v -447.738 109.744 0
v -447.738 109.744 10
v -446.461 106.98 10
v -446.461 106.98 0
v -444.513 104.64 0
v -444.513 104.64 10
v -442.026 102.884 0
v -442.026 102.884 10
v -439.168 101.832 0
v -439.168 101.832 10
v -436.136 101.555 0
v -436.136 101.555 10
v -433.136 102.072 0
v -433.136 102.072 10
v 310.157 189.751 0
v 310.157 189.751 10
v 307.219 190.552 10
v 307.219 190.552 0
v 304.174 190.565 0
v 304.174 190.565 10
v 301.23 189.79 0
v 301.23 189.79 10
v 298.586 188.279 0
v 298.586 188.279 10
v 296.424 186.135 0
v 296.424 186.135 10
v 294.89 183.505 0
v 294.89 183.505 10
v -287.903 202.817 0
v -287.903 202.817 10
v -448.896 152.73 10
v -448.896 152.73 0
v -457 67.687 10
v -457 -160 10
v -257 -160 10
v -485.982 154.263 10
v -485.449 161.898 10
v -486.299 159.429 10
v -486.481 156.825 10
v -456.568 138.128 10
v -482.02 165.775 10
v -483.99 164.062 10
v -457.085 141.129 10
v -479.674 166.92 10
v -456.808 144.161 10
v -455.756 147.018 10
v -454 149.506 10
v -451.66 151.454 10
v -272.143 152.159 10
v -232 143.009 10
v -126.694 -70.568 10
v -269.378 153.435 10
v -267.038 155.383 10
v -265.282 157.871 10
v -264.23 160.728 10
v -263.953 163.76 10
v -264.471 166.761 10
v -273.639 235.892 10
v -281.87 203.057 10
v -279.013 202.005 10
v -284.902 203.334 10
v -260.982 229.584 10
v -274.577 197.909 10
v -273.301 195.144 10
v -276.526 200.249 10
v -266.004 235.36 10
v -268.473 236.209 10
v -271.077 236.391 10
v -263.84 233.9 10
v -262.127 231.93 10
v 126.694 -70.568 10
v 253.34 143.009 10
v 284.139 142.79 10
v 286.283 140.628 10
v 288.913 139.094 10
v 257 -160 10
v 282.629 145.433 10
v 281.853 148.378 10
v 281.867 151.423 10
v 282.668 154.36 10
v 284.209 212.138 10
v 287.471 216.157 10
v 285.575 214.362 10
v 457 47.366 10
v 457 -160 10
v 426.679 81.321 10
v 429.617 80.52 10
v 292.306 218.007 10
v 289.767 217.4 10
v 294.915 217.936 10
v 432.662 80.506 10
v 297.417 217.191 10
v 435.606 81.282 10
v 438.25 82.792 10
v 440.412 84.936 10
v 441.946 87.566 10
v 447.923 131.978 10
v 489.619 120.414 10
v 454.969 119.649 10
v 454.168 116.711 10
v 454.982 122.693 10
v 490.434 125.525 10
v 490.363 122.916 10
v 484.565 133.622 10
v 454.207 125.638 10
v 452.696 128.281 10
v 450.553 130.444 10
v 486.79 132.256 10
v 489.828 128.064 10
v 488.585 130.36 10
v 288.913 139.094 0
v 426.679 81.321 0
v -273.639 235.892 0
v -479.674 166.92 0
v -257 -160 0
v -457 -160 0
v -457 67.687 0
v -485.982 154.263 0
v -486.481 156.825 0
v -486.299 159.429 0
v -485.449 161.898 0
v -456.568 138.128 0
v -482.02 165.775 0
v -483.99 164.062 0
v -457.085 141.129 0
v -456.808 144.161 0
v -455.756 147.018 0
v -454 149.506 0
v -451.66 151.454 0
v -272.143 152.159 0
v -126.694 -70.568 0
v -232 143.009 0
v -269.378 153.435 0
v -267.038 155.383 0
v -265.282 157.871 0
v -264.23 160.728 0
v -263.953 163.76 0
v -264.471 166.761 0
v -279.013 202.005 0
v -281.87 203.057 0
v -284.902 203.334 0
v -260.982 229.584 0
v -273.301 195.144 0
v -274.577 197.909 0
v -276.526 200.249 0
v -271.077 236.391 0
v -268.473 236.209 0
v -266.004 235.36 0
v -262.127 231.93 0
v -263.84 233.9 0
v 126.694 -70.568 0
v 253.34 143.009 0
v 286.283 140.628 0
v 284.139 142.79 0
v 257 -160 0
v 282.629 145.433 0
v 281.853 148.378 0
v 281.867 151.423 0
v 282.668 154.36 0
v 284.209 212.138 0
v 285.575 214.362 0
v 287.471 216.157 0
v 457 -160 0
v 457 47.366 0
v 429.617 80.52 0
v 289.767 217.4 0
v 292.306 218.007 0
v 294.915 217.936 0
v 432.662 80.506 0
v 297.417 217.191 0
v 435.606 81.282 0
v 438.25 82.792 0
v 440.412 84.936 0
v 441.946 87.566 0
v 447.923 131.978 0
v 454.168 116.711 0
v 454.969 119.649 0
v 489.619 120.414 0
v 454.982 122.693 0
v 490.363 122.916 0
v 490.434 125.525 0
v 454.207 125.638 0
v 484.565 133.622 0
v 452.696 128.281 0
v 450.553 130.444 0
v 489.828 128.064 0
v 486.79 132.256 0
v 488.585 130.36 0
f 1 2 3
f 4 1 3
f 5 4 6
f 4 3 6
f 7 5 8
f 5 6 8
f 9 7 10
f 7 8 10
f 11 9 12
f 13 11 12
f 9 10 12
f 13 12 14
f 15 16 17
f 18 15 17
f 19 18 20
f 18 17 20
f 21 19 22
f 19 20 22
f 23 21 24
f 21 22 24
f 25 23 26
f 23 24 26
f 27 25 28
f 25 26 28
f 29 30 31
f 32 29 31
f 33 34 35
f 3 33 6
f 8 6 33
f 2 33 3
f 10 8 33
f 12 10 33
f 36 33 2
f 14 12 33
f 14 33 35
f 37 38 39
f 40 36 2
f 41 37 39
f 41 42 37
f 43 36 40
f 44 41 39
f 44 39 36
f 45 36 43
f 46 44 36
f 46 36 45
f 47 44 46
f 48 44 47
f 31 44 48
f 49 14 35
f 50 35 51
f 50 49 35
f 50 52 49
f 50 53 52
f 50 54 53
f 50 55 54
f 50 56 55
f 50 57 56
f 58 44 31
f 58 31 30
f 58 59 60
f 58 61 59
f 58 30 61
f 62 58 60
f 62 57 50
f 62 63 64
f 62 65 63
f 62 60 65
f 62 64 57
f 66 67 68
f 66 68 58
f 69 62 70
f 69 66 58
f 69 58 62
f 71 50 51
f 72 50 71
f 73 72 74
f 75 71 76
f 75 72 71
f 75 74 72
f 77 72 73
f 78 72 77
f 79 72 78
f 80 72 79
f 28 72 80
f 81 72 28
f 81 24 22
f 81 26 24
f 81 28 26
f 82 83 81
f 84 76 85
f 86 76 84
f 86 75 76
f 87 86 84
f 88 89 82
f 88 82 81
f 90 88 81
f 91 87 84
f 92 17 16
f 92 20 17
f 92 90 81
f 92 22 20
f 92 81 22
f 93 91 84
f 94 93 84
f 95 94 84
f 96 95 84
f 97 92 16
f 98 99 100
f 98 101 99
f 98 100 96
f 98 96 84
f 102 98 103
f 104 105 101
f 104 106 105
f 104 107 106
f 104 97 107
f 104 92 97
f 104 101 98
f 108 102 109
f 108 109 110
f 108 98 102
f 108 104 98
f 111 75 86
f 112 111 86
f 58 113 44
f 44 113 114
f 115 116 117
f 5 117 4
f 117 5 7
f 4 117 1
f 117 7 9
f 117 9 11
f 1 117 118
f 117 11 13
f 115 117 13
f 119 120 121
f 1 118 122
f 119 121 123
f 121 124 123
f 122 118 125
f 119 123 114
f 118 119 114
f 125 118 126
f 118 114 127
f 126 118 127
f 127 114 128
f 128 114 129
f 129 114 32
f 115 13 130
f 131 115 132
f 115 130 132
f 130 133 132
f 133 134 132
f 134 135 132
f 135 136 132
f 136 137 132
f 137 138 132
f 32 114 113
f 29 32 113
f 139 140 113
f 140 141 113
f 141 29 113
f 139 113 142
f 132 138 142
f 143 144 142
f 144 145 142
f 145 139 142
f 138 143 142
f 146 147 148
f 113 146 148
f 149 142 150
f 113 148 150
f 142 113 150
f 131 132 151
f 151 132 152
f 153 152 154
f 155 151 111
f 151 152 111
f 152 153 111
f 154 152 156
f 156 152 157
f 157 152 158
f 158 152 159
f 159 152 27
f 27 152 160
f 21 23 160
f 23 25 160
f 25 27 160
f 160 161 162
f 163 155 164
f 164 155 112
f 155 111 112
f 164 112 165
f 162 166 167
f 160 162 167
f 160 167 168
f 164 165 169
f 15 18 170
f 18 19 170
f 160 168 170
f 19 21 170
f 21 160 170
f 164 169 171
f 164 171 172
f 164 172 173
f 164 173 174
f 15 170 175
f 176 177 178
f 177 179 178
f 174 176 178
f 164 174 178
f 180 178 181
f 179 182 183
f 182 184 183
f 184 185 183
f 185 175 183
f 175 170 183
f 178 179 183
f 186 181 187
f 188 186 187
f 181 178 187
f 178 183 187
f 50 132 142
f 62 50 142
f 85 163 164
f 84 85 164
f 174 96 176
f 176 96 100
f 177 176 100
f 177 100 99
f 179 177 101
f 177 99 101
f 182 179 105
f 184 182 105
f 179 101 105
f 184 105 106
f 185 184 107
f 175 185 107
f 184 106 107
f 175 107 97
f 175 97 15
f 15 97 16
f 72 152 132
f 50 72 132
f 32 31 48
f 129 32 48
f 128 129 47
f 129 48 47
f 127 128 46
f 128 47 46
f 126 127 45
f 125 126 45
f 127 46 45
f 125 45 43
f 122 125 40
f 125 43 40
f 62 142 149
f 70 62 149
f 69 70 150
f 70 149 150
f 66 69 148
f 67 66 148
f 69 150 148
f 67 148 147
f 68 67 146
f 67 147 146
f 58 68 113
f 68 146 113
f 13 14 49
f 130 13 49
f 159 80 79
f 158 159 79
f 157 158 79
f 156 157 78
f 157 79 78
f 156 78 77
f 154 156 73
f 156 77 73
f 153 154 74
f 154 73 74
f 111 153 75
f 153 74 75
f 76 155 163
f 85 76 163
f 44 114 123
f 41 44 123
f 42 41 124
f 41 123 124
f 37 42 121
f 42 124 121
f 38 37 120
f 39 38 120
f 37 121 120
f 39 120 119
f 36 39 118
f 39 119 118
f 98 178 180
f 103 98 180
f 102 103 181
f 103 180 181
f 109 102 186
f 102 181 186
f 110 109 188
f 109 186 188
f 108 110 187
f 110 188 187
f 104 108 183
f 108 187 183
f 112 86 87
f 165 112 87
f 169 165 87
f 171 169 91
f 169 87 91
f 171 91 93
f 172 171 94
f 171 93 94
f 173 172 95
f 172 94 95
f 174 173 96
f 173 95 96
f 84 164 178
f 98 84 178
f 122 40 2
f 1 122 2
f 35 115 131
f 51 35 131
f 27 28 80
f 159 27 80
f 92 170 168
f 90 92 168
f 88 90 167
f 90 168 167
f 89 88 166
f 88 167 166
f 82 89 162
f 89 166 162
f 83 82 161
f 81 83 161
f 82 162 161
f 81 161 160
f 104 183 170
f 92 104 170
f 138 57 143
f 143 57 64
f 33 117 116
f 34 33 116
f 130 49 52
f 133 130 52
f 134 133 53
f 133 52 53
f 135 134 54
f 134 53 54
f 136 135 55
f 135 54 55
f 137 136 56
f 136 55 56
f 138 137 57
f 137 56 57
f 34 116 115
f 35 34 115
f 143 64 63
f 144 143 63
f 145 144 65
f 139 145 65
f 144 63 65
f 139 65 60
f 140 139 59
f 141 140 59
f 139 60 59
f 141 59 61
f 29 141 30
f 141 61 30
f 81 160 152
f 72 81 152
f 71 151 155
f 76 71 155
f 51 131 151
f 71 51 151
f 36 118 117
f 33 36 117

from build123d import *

# Parameters (mm, degrees)
BOSS_EXTRUDE1_DEPTH = 10
CUT_EXTRUDE1_DEPTH  = 10
CUT_EXTRUDE2_DEPTH  = 10


with BuildPart() as part:
    # Sketch2 → Boss-Extrude1 (new body)
    with BuildSketch(Plane.XY):
        with BuildLine():
            Line((-257, -160), (-126.694416638, -70.567832456))
            Line((-126.694416638, -70.567832456), (126.694416638, -70.567832456))
            Line((126.694416638, -70.567832456), (257, -160))
            Line((257, -160), (457, -160))
            Line((457, -160), (457, 47.365686012))
            Line((457, 47.365686012), (489.618964007, 120.413637298))
            ThreePointArc((489.618964007, 120.413637298), (489.82769414, 128.064459181), (484.565340597, 133.622001709))
            Line((484.565340597, 133.622001709), (297.41734098, 217.19140723))
            ThreePointArc((297.41734098, 217.19140723), (289.766519097, 217.400137363), (284.208976569, 212.13778382))
            Line((284.208976569, 212.13778382), (253.339865194, 143.008508485))
            Line((253.339865194, 143.008508485), (-232, 143.008508485))
            Line((-232, 143.008508485), (-260.982148435, 229.584058556))
            ThreePointArc((-260.982148435, 229.584058556), (-266.004269265, 235.359605814), (-273.639373591, 235.892358751))
            Line((-273.639373591, 235.892358751), (-479.673848241, 166.919978879))
            ThreePointArc((-479.673848241, 166.919978879), (-485.449395499, 161.897858049), (-485.982148435, 154.262753723))
            Line((-485.982148435, 154.262753723), (-457, 67.687203652))
            Line((-457, 67.687203652), (-457, -160))
            Line((-457, -160), (-257, -160))
        make_face()
    extrude(amount=BOSS_EXTRUDE1_DEPTH)

    # Sketch3 → Cut-Extrude1 (cut)
    with BuildSketch(Plane.XY.offset(10)):
        with BuildLine():
            Line((-456.568069909, 138.128067643), (-447.737597005, 109.744404736))
            ThreePointArc((-447.737597005, 109.744404736), (-442.025570712, 102.884114481), (-433.135600426, 102.072169246))
            Line((-433.135600426, 102.072169246), (-272.142751839, 152.15883325))
            ThreePointArc((-272.142751839, 152.15883325), (-265.282461584, 157.870859543), (-264.470516349, 166.760829829))
            Line((-264.470516349, 166.760829829), (-273.300989253, 195.144492736))
            ThreePointArc((-273.300989253, 195.144492736), (-279.013015546, 202.004782992), (-287.902985832, 202.816728227))
            Line((-287.902985832, 202.816728227), (-448.895834419, 152.730064222))
            ThreePointArc((-448.895834419, 152.730064222), (-455.756124674, 147.01803793), (-456.568069909, 138.128067643))
        make_face()
    extrude(amount=-CUT_EXTRUDE1_DEPTH, mode=Mode.SUBTRACT)

    # Sketch4 → Cut-Extrude2 (cut)
    with BuildSketch(Plane.XY.offset(10)):
        with BuildLine():
            Line((294.889717658, 183.505126769), (282.667716754, 154.360355381))
            ThreePointArc((282.667716754, 154.360355381), (282.628613497, 145.433469155), (288.913225104, 139.093557192))
            Line((288.913225104, 139.093557192), (426.679323763, 81.320677109))
            ThreePointArc((426.679323763, 81.320677109), (435.606209989, 81.281573852), (441.946121952, 87.566185459))
            Line((441.946121952, 87.566185459), (454.168122857, 116.710956847))
            ThreePointArc((454.168122857, 116.710956847), (454.207226114, 125.637843073), (447.922614507, 131.977755036))
            Line((447.922614507, 131.977755036), (310.156515848, 189.750635119))
            ThreePointArc((310.156515848, 189.750635119), (301.229629622, 189.789738376), (294.889717658, 183.505126769))
        make_face()
    extrude(amount=-CUT_EXTRUDE2_DEPTH, mode=Mode.SUBTRACT)


solid = part.part
